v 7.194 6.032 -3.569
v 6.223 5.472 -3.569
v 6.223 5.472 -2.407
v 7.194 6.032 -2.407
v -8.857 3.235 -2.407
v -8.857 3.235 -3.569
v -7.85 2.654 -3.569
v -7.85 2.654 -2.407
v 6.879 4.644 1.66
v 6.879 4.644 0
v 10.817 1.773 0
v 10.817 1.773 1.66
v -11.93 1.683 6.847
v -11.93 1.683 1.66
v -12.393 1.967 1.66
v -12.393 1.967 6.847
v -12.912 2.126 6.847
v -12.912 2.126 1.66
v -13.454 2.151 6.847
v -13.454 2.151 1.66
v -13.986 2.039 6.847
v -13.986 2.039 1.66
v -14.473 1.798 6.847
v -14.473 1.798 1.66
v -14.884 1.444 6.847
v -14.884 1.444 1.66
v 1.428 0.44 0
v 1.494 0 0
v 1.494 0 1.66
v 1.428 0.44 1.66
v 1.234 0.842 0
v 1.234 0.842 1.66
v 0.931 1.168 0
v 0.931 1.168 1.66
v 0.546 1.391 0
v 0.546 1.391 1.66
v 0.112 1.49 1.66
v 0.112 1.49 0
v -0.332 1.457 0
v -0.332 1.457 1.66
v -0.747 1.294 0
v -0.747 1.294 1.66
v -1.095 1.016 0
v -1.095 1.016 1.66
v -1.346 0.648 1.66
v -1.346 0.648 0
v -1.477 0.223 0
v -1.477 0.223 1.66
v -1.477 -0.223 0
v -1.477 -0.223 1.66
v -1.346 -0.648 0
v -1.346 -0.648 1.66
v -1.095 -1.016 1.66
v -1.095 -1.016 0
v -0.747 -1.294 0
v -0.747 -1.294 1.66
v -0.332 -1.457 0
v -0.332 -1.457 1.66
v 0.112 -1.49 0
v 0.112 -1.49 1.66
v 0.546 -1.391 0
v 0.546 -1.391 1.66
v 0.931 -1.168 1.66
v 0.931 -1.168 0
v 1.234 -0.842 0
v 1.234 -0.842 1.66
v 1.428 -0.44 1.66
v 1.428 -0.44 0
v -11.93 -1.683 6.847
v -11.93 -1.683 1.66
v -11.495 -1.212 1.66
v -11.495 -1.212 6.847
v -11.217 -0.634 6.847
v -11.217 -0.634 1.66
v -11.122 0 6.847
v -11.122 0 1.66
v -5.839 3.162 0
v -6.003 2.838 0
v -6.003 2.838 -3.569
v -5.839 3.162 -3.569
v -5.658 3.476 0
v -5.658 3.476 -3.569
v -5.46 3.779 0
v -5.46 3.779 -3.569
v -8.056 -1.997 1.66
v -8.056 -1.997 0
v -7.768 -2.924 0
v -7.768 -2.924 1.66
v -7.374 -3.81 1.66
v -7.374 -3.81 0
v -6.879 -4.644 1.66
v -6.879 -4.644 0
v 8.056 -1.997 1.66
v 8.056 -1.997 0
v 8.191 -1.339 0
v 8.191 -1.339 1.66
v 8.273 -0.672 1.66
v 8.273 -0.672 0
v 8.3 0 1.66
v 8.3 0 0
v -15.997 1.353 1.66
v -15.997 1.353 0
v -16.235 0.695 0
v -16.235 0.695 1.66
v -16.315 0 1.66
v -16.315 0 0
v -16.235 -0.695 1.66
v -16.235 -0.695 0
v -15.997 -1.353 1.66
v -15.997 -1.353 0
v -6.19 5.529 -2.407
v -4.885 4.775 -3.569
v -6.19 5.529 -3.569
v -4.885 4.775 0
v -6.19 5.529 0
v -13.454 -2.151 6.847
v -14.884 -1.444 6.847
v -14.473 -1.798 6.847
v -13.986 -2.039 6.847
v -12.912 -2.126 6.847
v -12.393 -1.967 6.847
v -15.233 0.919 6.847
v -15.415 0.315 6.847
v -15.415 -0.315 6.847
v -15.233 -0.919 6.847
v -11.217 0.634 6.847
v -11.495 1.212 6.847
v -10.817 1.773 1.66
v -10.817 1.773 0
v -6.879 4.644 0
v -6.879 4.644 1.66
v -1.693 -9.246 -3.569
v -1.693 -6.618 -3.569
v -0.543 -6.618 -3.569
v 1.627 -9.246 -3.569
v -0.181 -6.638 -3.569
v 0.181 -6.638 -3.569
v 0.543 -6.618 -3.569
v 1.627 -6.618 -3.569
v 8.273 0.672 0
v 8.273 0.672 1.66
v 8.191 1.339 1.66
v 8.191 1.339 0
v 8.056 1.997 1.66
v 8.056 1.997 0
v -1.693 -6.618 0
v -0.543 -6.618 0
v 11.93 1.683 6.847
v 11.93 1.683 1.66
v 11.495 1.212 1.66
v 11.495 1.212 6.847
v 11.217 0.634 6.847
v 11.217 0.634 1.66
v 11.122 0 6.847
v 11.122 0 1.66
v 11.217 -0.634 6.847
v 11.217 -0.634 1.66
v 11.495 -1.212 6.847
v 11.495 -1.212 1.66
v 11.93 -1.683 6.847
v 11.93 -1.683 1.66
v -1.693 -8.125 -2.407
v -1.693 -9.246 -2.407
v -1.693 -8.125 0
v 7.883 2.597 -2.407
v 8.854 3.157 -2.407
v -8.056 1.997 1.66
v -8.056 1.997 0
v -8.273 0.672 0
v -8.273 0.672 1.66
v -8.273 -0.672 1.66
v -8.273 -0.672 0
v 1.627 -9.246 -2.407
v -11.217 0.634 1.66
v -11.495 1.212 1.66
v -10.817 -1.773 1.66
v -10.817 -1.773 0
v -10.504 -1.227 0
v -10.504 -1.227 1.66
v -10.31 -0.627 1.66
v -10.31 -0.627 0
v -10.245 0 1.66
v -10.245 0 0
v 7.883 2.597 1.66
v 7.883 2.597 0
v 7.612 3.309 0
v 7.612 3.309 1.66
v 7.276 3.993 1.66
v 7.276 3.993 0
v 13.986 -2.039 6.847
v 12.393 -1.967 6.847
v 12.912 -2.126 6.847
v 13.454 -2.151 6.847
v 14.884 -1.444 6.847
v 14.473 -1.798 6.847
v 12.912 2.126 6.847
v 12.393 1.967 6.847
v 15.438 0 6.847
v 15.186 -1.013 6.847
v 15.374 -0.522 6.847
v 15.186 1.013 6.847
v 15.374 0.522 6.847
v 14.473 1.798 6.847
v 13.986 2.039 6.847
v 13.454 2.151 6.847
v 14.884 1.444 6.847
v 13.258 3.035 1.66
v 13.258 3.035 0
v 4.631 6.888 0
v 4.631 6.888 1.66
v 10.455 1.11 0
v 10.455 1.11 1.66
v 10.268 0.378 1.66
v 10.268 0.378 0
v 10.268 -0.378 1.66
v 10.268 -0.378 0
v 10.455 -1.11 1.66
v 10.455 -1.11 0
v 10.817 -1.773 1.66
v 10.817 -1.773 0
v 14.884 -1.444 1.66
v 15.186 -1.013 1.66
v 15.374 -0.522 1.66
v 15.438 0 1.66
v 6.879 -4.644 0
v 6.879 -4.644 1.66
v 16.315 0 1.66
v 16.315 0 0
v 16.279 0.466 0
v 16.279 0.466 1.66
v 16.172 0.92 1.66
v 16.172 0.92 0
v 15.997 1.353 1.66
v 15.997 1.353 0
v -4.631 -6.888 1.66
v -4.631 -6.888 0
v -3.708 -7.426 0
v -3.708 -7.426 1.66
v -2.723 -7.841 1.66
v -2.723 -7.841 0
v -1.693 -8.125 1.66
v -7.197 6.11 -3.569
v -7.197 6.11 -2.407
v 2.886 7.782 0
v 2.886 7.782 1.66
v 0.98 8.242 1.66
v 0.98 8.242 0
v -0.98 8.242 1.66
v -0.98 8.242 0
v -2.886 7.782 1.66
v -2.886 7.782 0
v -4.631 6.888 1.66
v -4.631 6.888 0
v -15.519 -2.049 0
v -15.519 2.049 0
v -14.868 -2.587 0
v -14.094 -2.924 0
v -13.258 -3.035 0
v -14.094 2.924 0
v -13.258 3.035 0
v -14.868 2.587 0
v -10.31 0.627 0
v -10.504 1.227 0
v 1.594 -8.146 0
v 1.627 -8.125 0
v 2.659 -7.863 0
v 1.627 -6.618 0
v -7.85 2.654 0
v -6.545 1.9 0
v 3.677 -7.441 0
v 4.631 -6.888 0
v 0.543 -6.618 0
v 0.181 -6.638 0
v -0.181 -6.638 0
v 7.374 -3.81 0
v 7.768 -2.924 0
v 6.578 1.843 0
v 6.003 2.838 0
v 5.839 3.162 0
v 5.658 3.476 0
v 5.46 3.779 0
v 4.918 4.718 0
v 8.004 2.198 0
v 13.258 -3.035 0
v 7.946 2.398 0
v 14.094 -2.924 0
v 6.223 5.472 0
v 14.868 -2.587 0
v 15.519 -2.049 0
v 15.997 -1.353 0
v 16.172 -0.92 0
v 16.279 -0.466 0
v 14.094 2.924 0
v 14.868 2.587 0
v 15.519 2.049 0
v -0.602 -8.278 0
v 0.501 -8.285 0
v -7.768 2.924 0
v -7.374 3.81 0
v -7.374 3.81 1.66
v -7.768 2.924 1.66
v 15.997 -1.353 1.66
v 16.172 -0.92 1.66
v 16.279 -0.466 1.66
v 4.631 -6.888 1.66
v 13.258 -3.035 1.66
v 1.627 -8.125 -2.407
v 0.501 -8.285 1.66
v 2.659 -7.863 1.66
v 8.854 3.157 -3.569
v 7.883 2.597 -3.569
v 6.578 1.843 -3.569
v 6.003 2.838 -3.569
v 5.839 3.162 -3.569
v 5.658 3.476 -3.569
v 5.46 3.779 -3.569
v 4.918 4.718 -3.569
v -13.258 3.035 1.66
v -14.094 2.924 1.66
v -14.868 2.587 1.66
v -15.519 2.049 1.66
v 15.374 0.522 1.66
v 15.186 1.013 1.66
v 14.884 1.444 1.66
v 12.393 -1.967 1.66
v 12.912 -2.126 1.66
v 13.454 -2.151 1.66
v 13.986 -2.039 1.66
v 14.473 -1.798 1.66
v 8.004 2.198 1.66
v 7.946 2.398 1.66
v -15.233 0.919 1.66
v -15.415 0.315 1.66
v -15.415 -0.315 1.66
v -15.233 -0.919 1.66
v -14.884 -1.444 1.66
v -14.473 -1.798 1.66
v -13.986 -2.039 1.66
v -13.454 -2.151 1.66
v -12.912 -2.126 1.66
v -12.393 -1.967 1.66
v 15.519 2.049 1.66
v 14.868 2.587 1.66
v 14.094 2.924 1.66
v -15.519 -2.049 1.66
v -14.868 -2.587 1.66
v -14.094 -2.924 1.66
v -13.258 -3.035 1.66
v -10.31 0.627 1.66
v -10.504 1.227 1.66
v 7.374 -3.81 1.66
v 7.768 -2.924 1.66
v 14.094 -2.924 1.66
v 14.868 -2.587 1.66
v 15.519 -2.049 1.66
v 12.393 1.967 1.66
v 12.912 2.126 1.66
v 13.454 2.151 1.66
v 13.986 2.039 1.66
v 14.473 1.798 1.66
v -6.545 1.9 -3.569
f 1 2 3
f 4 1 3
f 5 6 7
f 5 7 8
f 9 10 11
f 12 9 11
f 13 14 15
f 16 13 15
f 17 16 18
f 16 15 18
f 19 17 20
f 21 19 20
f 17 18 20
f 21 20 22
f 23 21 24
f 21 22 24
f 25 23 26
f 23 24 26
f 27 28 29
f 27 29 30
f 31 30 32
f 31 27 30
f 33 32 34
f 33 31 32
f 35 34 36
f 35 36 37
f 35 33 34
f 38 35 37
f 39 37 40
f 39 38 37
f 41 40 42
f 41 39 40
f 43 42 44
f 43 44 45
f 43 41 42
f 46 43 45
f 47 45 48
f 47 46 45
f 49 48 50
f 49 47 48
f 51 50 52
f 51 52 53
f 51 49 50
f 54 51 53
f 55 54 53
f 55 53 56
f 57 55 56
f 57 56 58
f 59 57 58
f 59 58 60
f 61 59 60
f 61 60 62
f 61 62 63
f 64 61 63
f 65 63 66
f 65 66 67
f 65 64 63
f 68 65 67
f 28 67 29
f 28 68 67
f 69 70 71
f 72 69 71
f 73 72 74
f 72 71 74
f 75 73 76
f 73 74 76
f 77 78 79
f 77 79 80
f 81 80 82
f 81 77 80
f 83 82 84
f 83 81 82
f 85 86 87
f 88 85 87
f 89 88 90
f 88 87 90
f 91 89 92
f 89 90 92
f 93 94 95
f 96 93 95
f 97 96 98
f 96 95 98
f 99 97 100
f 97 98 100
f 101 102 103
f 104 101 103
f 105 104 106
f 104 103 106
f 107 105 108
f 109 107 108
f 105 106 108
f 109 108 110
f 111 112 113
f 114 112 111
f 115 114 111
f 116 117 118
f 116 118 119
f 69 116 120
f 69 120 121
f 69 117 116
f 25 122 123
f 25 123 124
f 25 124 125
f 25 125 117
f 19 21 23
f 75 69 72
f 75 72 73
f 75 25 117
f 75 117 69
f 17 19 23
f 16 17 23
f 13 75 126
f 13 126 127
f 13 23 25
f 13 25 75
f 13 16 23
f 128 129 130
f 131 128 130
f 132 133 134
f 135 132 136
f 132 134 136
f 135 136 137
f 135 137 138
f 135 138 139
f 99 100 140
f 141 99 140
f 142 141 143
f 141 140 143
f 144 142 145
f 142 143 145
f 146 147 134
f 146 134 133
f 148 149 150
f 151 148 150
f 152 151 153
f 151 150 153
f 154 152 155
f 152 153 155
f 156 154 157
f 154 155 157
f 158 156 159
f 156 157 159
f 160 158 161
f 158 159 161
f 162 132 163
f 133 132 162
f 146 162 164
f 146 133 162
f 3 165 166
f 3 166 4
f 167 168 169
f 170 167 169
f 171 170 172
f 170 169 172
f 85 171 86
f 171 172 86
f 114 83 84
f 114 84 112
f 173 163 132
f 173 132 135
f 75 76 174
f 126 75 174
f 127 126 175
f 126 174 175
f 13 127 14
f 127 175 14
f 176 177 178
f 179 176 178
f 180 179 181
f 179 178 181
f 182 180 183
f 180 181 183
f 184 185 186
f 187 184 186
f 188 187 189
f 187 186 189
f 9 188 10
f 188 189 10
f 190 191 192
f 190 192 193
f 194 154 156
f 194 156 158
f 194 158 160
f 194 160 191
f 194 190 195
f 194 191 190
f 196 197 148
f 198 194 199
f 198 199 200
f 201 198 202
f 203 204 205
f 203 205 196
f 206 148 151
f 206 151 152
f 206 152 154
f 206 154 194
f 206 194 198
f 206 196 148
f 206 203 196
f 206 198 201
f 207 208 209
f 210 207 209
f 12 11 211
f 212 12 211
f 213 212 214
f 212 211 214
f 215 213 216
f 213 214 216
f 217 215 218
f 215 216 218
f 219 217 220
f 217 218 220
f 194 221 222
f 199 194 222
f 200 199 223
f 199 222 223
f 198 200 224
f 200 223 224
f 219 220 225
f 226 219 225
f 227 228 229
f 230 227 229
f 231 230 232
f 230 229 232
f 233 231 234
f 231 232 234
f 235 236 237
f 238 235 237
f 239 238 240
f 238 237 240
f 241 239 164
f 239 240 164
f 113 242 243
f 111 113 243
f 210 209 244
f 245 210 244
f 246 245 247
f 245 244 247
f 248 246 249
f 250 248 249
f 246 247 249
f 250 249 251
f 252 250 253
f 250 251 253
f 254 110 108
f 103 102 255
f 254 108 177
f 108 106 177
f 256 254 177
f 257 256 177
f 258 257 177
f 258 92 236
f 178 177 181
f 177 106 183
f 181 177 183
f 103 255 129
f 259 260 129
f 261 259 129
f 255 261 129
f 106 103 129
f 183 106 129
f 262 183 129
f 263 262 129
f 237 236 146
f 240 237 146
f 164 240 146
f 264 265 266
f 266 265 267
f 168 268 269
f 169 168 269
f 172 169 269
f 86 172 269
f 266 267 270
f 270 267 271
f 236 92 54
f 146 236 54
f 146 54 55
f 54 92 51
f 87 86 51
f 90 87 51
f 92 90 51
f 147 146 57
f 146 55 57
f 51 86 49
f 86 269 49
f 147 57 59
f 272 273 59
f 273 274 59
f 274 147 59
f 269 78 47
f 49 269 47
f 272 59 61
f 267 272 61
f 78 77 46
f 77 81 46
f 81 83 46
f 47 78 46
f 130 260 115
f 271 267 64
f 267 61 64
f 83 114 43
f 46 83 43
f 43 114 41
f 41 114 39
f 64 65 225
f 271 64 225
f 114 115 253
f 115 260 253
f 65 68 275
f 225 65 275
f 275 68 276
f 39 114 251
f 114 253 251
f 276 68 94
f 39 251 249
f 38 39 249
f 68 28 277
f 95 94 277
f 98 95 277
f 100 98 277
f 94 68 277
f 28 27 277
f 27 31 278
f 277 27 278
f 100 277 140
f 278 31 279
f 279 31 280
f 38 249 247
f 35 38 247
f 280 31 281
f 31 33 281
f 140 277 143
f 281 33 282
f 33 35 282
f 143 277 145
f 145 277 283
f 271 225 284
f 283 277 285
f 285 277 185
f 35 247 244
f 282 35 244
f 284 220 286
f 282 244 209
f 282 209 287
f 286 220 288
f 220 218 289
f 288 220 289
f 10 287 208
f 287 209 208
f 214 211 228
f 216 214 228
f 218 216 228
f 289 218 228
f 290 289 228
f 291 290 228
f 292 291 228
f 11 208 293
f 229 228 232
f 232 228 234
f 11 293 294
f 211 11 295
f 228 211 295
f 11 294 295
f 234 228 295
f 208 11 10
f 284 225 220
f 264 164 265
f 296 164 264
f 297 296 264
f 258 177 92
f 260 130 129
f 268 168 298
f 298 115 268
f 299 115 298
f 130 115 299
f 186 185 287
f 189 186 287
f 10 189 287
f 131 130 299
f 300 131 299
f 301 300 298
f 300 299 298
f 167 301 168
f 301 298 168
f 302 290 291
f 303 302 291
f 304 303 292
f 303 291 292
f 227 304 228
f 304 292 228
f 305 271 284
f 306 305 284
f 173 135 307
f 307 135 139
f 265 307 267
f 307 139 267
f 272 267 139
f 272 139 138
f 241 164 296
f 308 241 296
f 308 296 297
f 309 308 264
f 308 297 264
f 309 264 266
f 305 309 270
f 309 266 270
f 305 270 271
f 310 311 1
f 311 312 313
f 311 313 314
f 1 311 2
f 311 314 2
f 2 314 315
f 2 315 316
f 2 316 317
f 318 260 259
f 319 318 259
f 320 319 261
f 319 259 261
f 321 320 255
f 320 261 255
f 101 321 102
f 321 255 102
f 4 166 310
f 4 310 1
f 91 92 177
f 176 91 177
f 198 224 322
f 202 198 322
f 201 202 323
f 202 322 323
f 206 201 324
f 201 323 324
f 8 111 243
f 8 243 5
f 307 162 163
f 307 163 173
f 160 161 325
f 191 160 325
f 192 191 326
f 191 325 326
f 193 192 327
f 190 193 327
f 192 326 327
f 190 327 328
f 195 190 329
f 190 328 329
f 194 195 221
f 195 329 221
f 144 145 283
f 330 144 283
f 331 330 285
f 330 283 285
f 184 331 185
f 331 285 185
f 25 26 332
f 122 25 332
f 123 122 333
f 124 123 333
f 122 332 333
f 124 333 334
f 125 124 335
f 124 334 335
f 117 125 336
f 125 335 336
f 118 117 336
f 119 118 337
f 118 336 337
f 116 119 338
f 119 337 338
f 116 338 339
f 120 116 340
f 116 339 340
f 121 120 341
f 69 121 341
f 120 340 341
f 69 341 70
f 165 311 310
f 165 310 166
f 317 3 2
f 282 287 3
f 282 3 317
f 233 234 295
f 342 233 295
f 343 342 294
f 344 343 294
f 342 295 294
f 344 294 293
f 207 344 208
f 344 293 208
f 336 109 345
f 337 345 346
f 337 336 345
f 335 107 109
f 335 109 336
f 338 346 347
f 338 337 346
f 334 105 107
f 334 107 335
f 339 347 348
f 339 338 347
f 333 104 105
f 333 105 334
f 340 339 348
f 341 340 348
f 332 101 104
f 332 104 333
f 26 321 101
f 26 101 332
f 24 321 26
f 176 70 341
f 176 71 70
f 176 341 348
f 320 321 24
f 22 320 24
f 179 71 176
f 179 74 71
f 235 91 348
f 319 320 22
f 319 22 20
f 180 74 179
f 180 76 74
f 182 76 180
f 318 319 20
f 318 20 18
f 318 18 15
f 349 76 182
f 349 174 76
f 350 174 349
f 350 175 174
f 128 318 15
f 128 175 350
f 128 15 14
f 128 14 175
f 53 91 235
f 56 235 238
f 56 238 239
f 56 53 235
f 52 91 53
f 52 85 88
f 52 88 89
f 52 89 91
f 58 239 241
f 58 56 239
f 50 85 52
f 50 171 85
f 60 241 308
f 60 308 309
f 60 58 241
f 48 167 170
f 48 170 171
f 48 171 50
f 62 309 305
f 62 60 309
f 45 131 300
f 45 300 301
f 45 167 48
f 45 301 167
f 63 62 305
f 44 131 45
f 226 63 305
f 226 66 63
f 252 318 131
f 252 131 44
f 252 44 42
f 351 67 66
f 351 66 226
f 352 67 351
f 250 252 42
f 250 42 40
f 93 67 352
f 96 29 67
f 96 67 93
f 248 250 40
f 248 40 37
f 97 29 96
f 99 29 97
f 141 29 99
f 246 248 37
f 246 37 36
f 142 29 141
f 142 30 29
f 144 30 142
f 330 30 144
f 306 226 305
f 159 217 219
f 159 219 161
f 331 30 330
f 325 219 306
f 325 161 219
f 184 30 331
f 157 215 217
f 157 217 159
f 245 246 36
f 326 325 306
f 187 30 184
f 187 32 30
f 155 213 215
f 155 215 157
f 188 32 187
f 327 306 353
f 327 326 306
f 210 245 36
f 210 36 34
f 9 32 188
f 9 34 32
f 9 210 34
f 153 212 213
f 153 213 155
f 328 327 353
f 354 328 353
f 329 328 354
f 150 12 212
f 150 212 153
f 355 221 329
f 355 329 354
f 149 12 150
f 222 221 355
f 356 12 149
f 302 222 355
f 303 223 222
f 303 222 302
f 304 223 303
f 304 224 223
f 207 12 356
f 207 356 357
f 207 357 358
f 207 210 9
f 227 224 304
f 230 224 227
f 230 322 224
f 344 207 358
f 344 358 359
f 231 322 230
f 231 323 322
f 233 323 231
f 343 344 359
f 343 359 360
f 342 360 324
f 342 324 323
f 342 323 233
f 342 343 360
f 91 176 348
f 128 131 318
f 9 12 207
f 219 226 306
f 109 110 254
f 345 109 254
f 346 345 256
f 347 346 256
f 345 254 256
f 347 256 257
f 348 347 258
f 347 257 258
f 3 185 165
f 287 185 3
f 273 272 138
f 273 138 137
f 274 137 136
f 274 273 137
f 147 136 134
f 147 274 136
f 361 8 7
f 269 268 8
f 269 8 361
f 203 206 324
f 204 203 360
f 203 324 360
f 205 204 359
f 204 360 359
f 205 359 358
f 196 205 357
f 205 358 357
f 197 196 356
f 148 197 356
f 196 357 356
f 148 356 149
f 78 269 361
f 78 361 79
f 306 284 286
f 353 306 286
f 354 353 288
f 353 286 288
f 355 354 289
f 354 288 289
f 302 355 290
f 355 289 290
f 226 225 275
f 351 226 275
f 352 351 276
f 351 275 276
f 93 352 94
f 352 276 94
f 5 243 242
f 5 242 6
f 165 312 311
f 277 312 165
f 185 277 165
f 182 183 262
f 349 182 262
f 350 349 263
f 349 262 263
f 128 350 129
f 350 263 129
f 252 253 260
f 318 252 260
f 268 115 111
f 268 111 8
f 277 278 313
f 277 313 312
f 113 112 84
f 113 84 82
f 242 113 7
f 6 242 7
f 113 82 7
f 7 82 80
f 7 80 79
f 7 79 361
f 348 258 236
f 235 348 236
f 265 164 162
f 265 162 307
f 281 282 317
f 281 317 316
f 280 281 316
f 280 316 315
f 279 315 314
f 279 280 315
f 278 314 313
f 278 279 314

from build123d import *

# Parameters (mm, degrees)
F0_R      = 1.8
F1_DEPTH  = 2
F2_DEPTH  = 8.25
F3_DEPTH  = 4.3
F4_W      = 4
F4_H      = 1.4
F5_DEPTH  = 1.35
F6_W      = 4
F6_H      = 1.4
F7_DEPTH  = 1.4
F8_W      = 4
F8_H      = 1.4
F9_DEPTH  = 1.35
F10_SCALE = 0.83


with BuildPart() as f1:
    # F0 (on Top) → F1 (new body)
    with BuildSketch(Plane.XY):
        with BuildLine():
            ThreePointArc((-15.9731018348, 3.6568268038), (-14.320799056, 3.2485981552), (-13.0322288298, 2.1366890427))
            Line((-13.0322288298, 2.1366890427), (-8.2881369278, 5.5952467565))
            ThreePointArc((-8.2881369278, 5.5952467565), (-7.8912200061, 6.1423649204), (-7.4582495736, 6.6614197659))
            ThreePointArc((-7.4582495736, 6.6614197659), (-6.5699540858, 7.5389457691), (-5.57922508, 8.2989305038))
            Line((-5.57922508, 8.2989305038), (-15.9731018348, 3.6568268038))
        make_face()
        with BuildLine():
            ThreePointArc((6.5777370937, 4.553391563), (0, 8), (-6.5777370937, 4.553391563))
            Line((-6.5777370937, 4.553391563), (-7.2322213138, 3.4197916411))
            ThreePointArc((-7.2322213138, 3.4197916411), (-6.9282032303, -4), (-0.6544842201, -7.9731832041))
            Line((-0.6544842201, -7.9731832041), (0.6544842201, -7.9731832041))
            ThreePointArc((0.6544842201, -7.9731832041), (5.883700951, -5.4205224028), (8, 0))
            ThreePointArc((8, 0), (7.8056956932, 1.7524596272), (7.2322213138, 3.4197916411))
            Line((7.2322213138, 3.4197916411), (6.5777370937, 4.553391563))
        make_face()
        Circle(F0_R, mode=Mode.SUBTRACT)
        with BuildLine():
            Line((-8.2881369278, -5.5952467565), (-13.0322288298, -2.1366890427))
            ThreePointArc((-13.0322288298, -2.1366890427), (-14.320799056, -3.2485981552), (-15.9731018348, -3.6568268038))
            Line((-15.9731018348, -3.6568268038), (-5.57922508, -8.2989305038))
            ThreePointArc((-5.57922508, -8.2989305038), (-7.0642344748, -7.0778945517), (-8.2881369278, -5.5952467565))
        make_face()
        with BuildLine():
            Line((-13.0322288298, -2.1366890427), (-14.3729098782, -2.0279491452))
            ThreePointArc((-14.3729098782, -2.0279491452), (-16.2101904462, -2.5914899144), (-17.9326380631, -1.7392268733))
            Line((-17.9326380631, -1.7392268733), (-19.2733191115, -1.6304869758))
            ThreePointArc((-19.2733191115, -1.6304869758), (-17.9134590444, -3.1163729349), (-15.9731018348, -3.6568268038))
            ThreePointArc((-15.9731018348, -3.6568268038), (-14.320799056, -3.2485981552), (-13.0322288298, -2.1366890427))
        make_face()
        with BuildLine():
            ThreePointArc((-17.9326380631, -1.7392268733), (-18.6, 0), (-17.9326380631, 1.7392268733))
            Line((-17.9326380631, 1.7392268733), (-19.2733191115, 1.6304869758))
            ThreePointArc((-19.2733191115, 1.6304869758), (-19.6569257285, 0), (-19.2733191115, -1.6304869758))
            Line((-19.2733191115, -1.6304869758), (-17.9326380631, -1.7392268733))
        make_face()
        with BuildLine():
            ThreePointArc((-17.9326380631, 1.7392268733), (-16.2101904462, 2.5914899144), (-14.3729098782, 2.0279491452))
            Line((-14.3729098782, 2.0279491452), (-13.0322288298, 2.1366890427))
            ThreePointArc((-13.0322288298, 2.1366890427), (-14.320799056, 3.2485981552), (-15.9731018348, 3.6568268038))
            ThreePointArc((-15.9731018348, 3.6568268038), (-17.9134590444, 3.1163729349), (-19.2733191115, 1.6304869758))
            Line((-19.2733191115, 1.6304869758), (-17.9326380631, 1.7392268733))
        make_face()
        with BuildLine():
            ThreePointArc((-14.3729098782, 2.0279491452), (-13.6558120471, 1.1246256451), (-13.4, 0))
            ThreePointArc((-13.4, 0), (-13.6558120471, -1.1246256451), (-14.3729098782, -2.0279491452))
            Line((-14.3729098782, -2.0279491452), (-13.0322288298, -2.1366890427))
            ThreePointArc((-13.0322288298, -2.1366890427), (-12.5196246946, -1.1225388713), (-12.3430742715, 0))
            ThreePointArc((-12.3430742715, 0), (-12.5196246946, 1.1225388713), (-13.0322288298, 2.1366890427))
            Line((-13.0322288298, 2.1366890427), (-14.3729098782, 2.0279491452))
        make_face()
        with BuildLine():
            ThreePointArc((8.2881369278, -5.5952467565), (7.0642344748, -7.0778945517), (5.57922508, -8.2989305038))
            Line((5.57922508, -8.2989305038), (15.9731018348, -3.6568268038))
            ThreePointArc((15.9731018348, -3.6568268038), (14.320799056, -3.2485981552), (13.0322288298, -2.1366890427))
            Line((13.0322288298, -2.1366890427), (8.2881369278, -5.5952467565))
        make_face()
        with BuildLine():
            Line((15.9731018348, 3.6568268038), (5.57922508, 8.2989305038))
            ThreePointArc((5.57922508, 8.2989305038), (7.0642344748, 7.0778945517), (8.2881369278, 5.5952467565))
            Line((8.2881369278, 5.5952467565), (13.0322288298, 2.1366890427))
            ThreePointArc((13.0322288298, 2.1366890427), (14.320799056, 3.2485981552), (15.9731018348, 3.6568268038))
        make_face()
        with BuildLine():
            ThreePointArc((19.2733191115, 1.6304869758), (17.9134590444, 3.1163729349), (15.9731018348, 3.6568268038))
            ThreePointArc((15.9731018348, 3.6568268038), (14.320799056, 3.2485981552), (13.0322288298, 2.1366890427))
            Line((13.0322288298, 2.1366890427), (14.3729098782, 2.0279491452))
            ThreePointArc((14.3729098782, 2.0279491452), (16.2101904462, 2.5914899144), (17.9326380631, 1.7392268733))
            Line((17.9326380631, 1.7392268733), (19.2733191115, 1.6304869758))
        make_face()
        with BuildLine():
            Line((14.3729098782, 2.0279491452), (13.0322288298, 2.1366890427))
            ThreePointArc((13.0322288298, 2.1366890427), (12.3430742715, 0), (13.0322288298, -2.1366890427))
            Line((13.0322288298, -2.1366890427), (14.3729098782, -2.0279491452))
            ThreePointArc((14.3729098782, -2.0279491452), (13.4, 0), (14.3729098782, 2.0279491452))
        make_face()
        with BuildLine():
            ThreePointArc((13.0322288298, -2.1366890427), (14.320799056, -3.2485981552), (15.9731018348, -3.6568268038))
            ThreePointArc((15.9731018348, -3.6568268038), (17.9134590444, -3.1163729349), (19.2733191115, -1.6304869758))
            Line((19.2733191115, -1.6304869758), (17.9326380631, -1.7392268733))
            ThreePointArc((17.9326380631, -1.7392268733), (16.2101904462, -2.5914899144), (14.3729098782, -2.0279491452))
            Line((14.3729098782, -2.0279491452), (13.0322288298, -2.1366890427))
        make_face()
        with BuildLine():
            ThreePointArc((19.6569257285, 0), (19.5597324802, 0.8375025097), (19.2733191115, 1.6304869758))
            Line((19.2733191115, 1.6304869758), (17.9326380631, 1.7392268733))
            ThreePointArc((17.9326380631, 1.7392268733), (18.4274326936, 0.9314346558), (18.6, 0))
            ThreePointArc((18.6, 0), (18.4274326936, -0.9314346558), (17.9326380631, -1.7392268733))
            Line((17.9326380631, -1.7392268733), (19.2733191115, -1.6304869758))
            ThreePointArc((19.2733191115, -1.6304869758), (19.5597324802, -0.8375025097), (19.6569257285, 0))
        make_face()
        with BuildLine():
            Line((1.9601660443, -9.7897434815), (-2.0398339557, -9.7897434815))
            ThreePointArc((-2.0398339557, -9.7897434815), (1.9202742555, -9.8138955967), (5.57922508, -8.2989305038))
            ThreePointArc((5.57922508, -8.2989305038), (7.0642344748, -7.0778945517), (8.2881369278, -5.5952467565))
            ThreePointArc((8.2881369278, -5.5952467565), (9.1373129578, -4.0631898691), (9.7061289754, -2.4064621985))
            ThreePointArc((9.7061289754, -2.4064621985), (9.9262603672, -1.2121695933), (10, 0))
            ThreePointArc((10, 0), (9.9262603672, 1.2121695933), (9.7061289754, 2.4064621985))
            ThreePointArc((9.7061289754, 2.4064621985), (9.6088873182, 2.7693473068), (9.4980835293, 3.1283237156))
            Line((9.4980835293, 3.1283237156), (7.9248961816, 2.2200435769))
            Line((7.9248961816, 2.2200435769), (7.2322213138, 3.4197916411))
            ThreePointArc((7.2322213138, 3.4197916411), (7.8056956932, 1.7524596272), (8, 0))
            ThreePointArc((8, 0), (5.883700951, -5.4205224028), (0.6544842201, -7.9731832041))
            Line((0.6544842201, -7.9731832041), (1.9601660443, -7.9731832041))
            Line((1.9601660443, -7.9731832041), (1.9601660443, -9.7897434815))
        make_face()
        with BuildLine():
            ThreePointArc((-8.2881369278, 5.5952467565), (-9.1373129578, 4.0631898691), (-9.7061289754, 2.4064621985))
            ThreePointArc((-9.7061289754, 2.4064621985), (-10, 0), (-9.7061289754, -2.4064621985))
            ThreePointArc((-9.7061289754, -2.4064621985), (-9.1373129578, -4.0631898691), (-8.2881369278, -5.5952467565))
            ThreePointArc((-8.2881369278, -5.5952467565), (-7.0642344748, -7.0778945517), (-5.57922508, -8.2989305038))
            ThreePointArc((-5.57922508, -8.2989305038), (-3.8817709851, -9.2158479816), (-2.0398339557, -9.7897434815))
            Line((-2.0398339557, -9.7897434815), (-2.0398339557, -7.9731832041))
            Line((-2.0398339557, -7.9731832041), (-0.6544842201, -7.9731832041))
            ThreePointArc((-0.6544842201, -7.9731832041), (-6.9282032303, -4), (-7.2322213138, 3.4197916411))
            Line((-7.2322213138, 3.4197916411), (-7.8850622259, 2.289038012))
            Line((-7.8850622259, 2.289038012), (-9.4582495736, 3.1973181507))
            Line((-9.4582495736, 3.1973181507), (-7.4582495736, 6.6614197659))
            ThreePointArc((-7.4582495736, 6.6614197659), (-7.8912200061, 6.1423649204), (-8.2881369278, 5.5952467565))
        make_face()
        with BuildLine():
            ThreePointArc((5.57922508, 8.2989305038), (0, 10), (-5.57922508, 8.2989305038))
            ThreePointArc((-5.57922508, 8.2989305038), (-6.5699540858, 7.5389457691), (-7.4582495736, 6.6614197659))
            Line((-7.4582495736, 6.6614197659), (-5.8850622259, 5.7531396272))
            Line((-5.8850622259, 5.7531396272), (-6.5777370937, 4.553391563))
            ThreePointArc((-6.5777370937, 4.553391563), (0, 8), (6.5777370937, 4.553391563))
            Line((6.5777370937, 4.553391563), (5.9248961816, 5.684145192))
            Line((5.9248961816, 5.684145192), (7.4980835293, 6.5924253307))
            Line((7.4980835293, 6.5924253307), (9.4980835293, 3.1283237156))
            ThreePointArc((9.4980835293, 3.1283237156), (8.9782424149, 4.403539842), (8.2881369278, 5.5952467565))
            ThreePointArc((8.2881369278, 5.5952467565), (7.0642344748, 7.0778945517), (5.57922508, 8.2989305038))
        make_face()
        with BuildLine():
            Line((-2.0398339557, -7.9731832041), (-2.0398339557, -9.7897434815))
            Line((-2.0398339557, -9.7897434815), (1.9601660443, -9.7897434815))
            Line((1.9601660443, -9.7897434815), (1.9601660443, -7.9731832041))
            Line((1.9601660443, -7.9731832041), (0.6544842201, -7.9731832041))
            ThreePointArc((0.6544842201, -7.9731832041), (0, -8), (-0.6544842201, -7.9731832041))
            Line((-0.6544842201, -7.9731832041), (-2.0398339557, -7.9731832041))
        make_face()
        with BuildLine():
            Line((-5.8850622259, 5.7531396272), (-7.4582495736, 6.6614197659))
            Line((-7.4582495736, 6.6614197659), (-9.4582495736, 3.1973181507))
            Line((-9.4582495736, 3.1973181507), (-7.8850622259, 2.289038012))
            Line((-7.8850622259, 2.289038012), (-7.2322213138, 3.4197916411))
            ThreePointArc((-7.2322213138, 3.4197916411), (-6.9282032303, 4), (-6.5777370937, 4.553391563))
            Line((-6.5777370937, 4.553391563), (-5.8850622259, 5.7531396272))
        make_face()
        with BuildLine():
            Line((7.9248961816, 2.2200435769), (9.4980835293, 3.1283237156))
            Line((9.4980835293, 3.1283237156), (7.4980835293, 6.5924253307))
            Line((7.4980835293, 6.5924253307), (5.9248961816, 5.684145192))
            Line((5.9248961816, 5.684145192), (6.5777370937, 4.553391563))
            ThreePointArc((6.5777370937, 4.553391563), (6.9282032303, 4), (7.2322213138, 3.4197916411))
            Line((7.2322213138, 3.4197916411), (7.9248961816, 2.2200435769))
        make_face()
        with BuildLine():
            Line((0.6544842201, -7.9731832041), (-0.6544842201, -7.9731832041))
            ThreePointArc((-0.6544842201, -7.9731832041), (0, -8), (0.6544842201, -7.9731832041))
        make_face()
        with BuildLine():
            Line((-7.2322213138, 3.4197916411), (-6.5777370937, 4.553391563))
            ThreePointArc((-6.5777370937, 4.553391563), (-6.9282032303, 4), (-7.2322213138, 3.4197916411))
        make_face()
        with BuildLine():
            ThreePointArc((7.2322213138, 3.4197916411), (6.9282032303, 4), (6.5777370937, 4.553391563))
            Line((6.5777370937, 4.553391563), (7.2322213138, 3.4197916411))
        make_face()
    extrude(amount=F1_DEPTH)

    # F0 (on Top) → F2 (join)
    with BuildSketch(Plane.XY):
        with BuildLine():
            ThreePointArc((-14.3729098782, -2.0279491452), (-13.6558120471, -1.1246256451), (-13.4, 0))
            ThreePointArc((-13.4, 0), (-13.6558120471, 1.1246256451), (-14.3729098782, 2.0279491452))
            Line((-14.3729098782, 2.0279491452), (-17.9326380631, 1.7392268733))
            ThreePointArc((-17.9326380631, 1.7392268733), (-18.6, 0), (-17.9326380631, -1.7392268733))
            Line((-17.9326380631, -1.7392268733), (-14.3729098782, -2.0279491452))
        make_face()
        with BuildLine():
            Line((17.9326380631, 1.7392268733), (14.3729098782, 2.0279491452))
            ThreePointArc((14.3729098782, 2.0279491452), (13.4, 0), (14.3729098782, -2.0279491452))
            Line((14.3729098782, -2.0279491452), (17.9326380631, -1.7392268733))
            ThreePointArc((17.9326380631, -1.7392268733), (18.4274326936, -0.9314346558), (18.6, 0))
            ThreePointArc((18.6, 0), (18.4274326936, 0.9314346558), (17.9326380631, 1.7392268733))
        make_face()
        with BuildLine():
            Line((-17.9326380631, 1.7392268733), (-14.3729098782, 2.0279491452))
            ThreePointArc((-14.3729098782, 2.0279491452), (-16.2101904462, 2.5914899144), (-17.9326380631, 1.7392268733))
        make_face()
        with BuildLine():
            ThreePointArc((-17.9326380631, -1.7392268733), (-16.2101904462, -2.5914899144), (-14.3729098782, -2.0279491452))
            Line((-14.3729098782, -2.0279491452), (-17.9326380631, -1.7392268733))
        make_face()
        with BuildLine():
            Line((17.9326380631, -1.7392268733), (14.3729098782, -2.0279491452))
            ThreePointArc((14.3729098782, -2.0279491452), (16.2101904462, -2.5914899144), (17.9326380631, -1.7392268733))
        make_face()
        with BuildLine():
            ThreePointArc((17.9326380631, 1.7392268733), (16.2101904462, 2.5914899144), (14.3729098782, 2.0279491452))
            Line((14.3729098782, 2.0279491452), (17.9326380631, 1.7392268733))
        make_face()
    extrude(amount=F2_DEPTH)

    # F0 (on Top) → F3 (join)
    with BuildSketch(Plane.XY):
        with BuildLine():
            Line((-5.8850622259, 5.7531396272), (-7.4582495736, 6.6614197659))
            Line((-7.4582495736, 6.6614197659), (-9.4582495736, 3.1973181507))
            Line((-9.4582495736, 3.1973181507), (-7.8850622259, 2.289038012))
            Line((-7.8850622259, 2.289038012), (-7.2322213138, 3.4197916411))
            ThreePointArc((-7.2322213138, 3.4197916411), (-6.9282032303, 4), (-6.5777370937, 4.553391563))
            Line((-6.5777370937, 4.553391563), (-5.8850622259, 5.7531396272))
        make_face()
        with BuildLine():
            Line((7.9248961816, 2.2200435769), (9.4980835293, 3.1283237156))
            Line((9.4980835293, 3.1283237156), (7.4980835293, 6.5924253307))
            Line((7.4980835293, 6.5924253307), (5.9248961816, 5.684145192))
            Line((5.9248961816, 5.684145192), (6.5777370937, 4.553391563))
            ThreePointArc((6.5777370937, 4.553391563), (6.9282032303, 4), (7.2322213138, 3.4197916411))
            Line((7.2322213138, 3.4197916411), (7.9248961816, 2.2200435769))
        make_face()
        with BuildLine():
            Line((-2.0398339557, -7.9731832041), (-2.0398339557, -9.7897434815))
            Line((-2.0398339557, -9.7897434815), (1.9601660443, -9.7897434815))
            Line((1.9601660443, -9.7897434815), (1.9601660443, -7.9731832041))
            Line((1.9601660443, -7.9731832041), (0.6544842201, -7.9731832041))
            ThreePointArc((0.6544842201, -7.9731832041), (0, -8), (-0.6544842201, -7.9731832041))
            Line((-0.6544842201, -7.9731832041), (-2.0398339557, -7.9731832041))
        make_face()
    extrude(amount=-F3_DEPTH)

    # F4 (on face) → F5 (join)
    with BuildSketch(Plane.XZ.offset(9.7897434815)):
        with Locations((-0.0398339557, -3.6)):
            Rectangle(F4_W, F4_H)
    extrude(amount=F5_DEPTH)

    # F6 (on face) → F7 (join)
    with BuildSketch(Plane(origin=(-8.4781665515, 4.8948717407, 0), x_dir=(-0.5, -0.8660254038, 0), z_dir=(-0.8660254038, 0.5, 0))):
        with Locations((-0.0398339557, -3.6)):
            Rectangle(F6_W, F6_H)
    extrude(amount=F7_DEPTH)

    # F8 (on face) → F9 (join)
    with BuildSketch(Plane(origin=(8.4781665515, 4.8948717407, 0), x_dir=(-0.5, 0.8660254038, 0), z_dir=(0.8660254038, 0.5, 0))):
        with Locations((-0.0398339557, -3.6)):
            Rectangle(F8_W, F8_H)
    extrude(amount=F9_DEPTH)


with BuildPart() as f1_1:
    # F10: moved
    add(f1.part.scale(F10_SCALE))


solid = f1_1.part
